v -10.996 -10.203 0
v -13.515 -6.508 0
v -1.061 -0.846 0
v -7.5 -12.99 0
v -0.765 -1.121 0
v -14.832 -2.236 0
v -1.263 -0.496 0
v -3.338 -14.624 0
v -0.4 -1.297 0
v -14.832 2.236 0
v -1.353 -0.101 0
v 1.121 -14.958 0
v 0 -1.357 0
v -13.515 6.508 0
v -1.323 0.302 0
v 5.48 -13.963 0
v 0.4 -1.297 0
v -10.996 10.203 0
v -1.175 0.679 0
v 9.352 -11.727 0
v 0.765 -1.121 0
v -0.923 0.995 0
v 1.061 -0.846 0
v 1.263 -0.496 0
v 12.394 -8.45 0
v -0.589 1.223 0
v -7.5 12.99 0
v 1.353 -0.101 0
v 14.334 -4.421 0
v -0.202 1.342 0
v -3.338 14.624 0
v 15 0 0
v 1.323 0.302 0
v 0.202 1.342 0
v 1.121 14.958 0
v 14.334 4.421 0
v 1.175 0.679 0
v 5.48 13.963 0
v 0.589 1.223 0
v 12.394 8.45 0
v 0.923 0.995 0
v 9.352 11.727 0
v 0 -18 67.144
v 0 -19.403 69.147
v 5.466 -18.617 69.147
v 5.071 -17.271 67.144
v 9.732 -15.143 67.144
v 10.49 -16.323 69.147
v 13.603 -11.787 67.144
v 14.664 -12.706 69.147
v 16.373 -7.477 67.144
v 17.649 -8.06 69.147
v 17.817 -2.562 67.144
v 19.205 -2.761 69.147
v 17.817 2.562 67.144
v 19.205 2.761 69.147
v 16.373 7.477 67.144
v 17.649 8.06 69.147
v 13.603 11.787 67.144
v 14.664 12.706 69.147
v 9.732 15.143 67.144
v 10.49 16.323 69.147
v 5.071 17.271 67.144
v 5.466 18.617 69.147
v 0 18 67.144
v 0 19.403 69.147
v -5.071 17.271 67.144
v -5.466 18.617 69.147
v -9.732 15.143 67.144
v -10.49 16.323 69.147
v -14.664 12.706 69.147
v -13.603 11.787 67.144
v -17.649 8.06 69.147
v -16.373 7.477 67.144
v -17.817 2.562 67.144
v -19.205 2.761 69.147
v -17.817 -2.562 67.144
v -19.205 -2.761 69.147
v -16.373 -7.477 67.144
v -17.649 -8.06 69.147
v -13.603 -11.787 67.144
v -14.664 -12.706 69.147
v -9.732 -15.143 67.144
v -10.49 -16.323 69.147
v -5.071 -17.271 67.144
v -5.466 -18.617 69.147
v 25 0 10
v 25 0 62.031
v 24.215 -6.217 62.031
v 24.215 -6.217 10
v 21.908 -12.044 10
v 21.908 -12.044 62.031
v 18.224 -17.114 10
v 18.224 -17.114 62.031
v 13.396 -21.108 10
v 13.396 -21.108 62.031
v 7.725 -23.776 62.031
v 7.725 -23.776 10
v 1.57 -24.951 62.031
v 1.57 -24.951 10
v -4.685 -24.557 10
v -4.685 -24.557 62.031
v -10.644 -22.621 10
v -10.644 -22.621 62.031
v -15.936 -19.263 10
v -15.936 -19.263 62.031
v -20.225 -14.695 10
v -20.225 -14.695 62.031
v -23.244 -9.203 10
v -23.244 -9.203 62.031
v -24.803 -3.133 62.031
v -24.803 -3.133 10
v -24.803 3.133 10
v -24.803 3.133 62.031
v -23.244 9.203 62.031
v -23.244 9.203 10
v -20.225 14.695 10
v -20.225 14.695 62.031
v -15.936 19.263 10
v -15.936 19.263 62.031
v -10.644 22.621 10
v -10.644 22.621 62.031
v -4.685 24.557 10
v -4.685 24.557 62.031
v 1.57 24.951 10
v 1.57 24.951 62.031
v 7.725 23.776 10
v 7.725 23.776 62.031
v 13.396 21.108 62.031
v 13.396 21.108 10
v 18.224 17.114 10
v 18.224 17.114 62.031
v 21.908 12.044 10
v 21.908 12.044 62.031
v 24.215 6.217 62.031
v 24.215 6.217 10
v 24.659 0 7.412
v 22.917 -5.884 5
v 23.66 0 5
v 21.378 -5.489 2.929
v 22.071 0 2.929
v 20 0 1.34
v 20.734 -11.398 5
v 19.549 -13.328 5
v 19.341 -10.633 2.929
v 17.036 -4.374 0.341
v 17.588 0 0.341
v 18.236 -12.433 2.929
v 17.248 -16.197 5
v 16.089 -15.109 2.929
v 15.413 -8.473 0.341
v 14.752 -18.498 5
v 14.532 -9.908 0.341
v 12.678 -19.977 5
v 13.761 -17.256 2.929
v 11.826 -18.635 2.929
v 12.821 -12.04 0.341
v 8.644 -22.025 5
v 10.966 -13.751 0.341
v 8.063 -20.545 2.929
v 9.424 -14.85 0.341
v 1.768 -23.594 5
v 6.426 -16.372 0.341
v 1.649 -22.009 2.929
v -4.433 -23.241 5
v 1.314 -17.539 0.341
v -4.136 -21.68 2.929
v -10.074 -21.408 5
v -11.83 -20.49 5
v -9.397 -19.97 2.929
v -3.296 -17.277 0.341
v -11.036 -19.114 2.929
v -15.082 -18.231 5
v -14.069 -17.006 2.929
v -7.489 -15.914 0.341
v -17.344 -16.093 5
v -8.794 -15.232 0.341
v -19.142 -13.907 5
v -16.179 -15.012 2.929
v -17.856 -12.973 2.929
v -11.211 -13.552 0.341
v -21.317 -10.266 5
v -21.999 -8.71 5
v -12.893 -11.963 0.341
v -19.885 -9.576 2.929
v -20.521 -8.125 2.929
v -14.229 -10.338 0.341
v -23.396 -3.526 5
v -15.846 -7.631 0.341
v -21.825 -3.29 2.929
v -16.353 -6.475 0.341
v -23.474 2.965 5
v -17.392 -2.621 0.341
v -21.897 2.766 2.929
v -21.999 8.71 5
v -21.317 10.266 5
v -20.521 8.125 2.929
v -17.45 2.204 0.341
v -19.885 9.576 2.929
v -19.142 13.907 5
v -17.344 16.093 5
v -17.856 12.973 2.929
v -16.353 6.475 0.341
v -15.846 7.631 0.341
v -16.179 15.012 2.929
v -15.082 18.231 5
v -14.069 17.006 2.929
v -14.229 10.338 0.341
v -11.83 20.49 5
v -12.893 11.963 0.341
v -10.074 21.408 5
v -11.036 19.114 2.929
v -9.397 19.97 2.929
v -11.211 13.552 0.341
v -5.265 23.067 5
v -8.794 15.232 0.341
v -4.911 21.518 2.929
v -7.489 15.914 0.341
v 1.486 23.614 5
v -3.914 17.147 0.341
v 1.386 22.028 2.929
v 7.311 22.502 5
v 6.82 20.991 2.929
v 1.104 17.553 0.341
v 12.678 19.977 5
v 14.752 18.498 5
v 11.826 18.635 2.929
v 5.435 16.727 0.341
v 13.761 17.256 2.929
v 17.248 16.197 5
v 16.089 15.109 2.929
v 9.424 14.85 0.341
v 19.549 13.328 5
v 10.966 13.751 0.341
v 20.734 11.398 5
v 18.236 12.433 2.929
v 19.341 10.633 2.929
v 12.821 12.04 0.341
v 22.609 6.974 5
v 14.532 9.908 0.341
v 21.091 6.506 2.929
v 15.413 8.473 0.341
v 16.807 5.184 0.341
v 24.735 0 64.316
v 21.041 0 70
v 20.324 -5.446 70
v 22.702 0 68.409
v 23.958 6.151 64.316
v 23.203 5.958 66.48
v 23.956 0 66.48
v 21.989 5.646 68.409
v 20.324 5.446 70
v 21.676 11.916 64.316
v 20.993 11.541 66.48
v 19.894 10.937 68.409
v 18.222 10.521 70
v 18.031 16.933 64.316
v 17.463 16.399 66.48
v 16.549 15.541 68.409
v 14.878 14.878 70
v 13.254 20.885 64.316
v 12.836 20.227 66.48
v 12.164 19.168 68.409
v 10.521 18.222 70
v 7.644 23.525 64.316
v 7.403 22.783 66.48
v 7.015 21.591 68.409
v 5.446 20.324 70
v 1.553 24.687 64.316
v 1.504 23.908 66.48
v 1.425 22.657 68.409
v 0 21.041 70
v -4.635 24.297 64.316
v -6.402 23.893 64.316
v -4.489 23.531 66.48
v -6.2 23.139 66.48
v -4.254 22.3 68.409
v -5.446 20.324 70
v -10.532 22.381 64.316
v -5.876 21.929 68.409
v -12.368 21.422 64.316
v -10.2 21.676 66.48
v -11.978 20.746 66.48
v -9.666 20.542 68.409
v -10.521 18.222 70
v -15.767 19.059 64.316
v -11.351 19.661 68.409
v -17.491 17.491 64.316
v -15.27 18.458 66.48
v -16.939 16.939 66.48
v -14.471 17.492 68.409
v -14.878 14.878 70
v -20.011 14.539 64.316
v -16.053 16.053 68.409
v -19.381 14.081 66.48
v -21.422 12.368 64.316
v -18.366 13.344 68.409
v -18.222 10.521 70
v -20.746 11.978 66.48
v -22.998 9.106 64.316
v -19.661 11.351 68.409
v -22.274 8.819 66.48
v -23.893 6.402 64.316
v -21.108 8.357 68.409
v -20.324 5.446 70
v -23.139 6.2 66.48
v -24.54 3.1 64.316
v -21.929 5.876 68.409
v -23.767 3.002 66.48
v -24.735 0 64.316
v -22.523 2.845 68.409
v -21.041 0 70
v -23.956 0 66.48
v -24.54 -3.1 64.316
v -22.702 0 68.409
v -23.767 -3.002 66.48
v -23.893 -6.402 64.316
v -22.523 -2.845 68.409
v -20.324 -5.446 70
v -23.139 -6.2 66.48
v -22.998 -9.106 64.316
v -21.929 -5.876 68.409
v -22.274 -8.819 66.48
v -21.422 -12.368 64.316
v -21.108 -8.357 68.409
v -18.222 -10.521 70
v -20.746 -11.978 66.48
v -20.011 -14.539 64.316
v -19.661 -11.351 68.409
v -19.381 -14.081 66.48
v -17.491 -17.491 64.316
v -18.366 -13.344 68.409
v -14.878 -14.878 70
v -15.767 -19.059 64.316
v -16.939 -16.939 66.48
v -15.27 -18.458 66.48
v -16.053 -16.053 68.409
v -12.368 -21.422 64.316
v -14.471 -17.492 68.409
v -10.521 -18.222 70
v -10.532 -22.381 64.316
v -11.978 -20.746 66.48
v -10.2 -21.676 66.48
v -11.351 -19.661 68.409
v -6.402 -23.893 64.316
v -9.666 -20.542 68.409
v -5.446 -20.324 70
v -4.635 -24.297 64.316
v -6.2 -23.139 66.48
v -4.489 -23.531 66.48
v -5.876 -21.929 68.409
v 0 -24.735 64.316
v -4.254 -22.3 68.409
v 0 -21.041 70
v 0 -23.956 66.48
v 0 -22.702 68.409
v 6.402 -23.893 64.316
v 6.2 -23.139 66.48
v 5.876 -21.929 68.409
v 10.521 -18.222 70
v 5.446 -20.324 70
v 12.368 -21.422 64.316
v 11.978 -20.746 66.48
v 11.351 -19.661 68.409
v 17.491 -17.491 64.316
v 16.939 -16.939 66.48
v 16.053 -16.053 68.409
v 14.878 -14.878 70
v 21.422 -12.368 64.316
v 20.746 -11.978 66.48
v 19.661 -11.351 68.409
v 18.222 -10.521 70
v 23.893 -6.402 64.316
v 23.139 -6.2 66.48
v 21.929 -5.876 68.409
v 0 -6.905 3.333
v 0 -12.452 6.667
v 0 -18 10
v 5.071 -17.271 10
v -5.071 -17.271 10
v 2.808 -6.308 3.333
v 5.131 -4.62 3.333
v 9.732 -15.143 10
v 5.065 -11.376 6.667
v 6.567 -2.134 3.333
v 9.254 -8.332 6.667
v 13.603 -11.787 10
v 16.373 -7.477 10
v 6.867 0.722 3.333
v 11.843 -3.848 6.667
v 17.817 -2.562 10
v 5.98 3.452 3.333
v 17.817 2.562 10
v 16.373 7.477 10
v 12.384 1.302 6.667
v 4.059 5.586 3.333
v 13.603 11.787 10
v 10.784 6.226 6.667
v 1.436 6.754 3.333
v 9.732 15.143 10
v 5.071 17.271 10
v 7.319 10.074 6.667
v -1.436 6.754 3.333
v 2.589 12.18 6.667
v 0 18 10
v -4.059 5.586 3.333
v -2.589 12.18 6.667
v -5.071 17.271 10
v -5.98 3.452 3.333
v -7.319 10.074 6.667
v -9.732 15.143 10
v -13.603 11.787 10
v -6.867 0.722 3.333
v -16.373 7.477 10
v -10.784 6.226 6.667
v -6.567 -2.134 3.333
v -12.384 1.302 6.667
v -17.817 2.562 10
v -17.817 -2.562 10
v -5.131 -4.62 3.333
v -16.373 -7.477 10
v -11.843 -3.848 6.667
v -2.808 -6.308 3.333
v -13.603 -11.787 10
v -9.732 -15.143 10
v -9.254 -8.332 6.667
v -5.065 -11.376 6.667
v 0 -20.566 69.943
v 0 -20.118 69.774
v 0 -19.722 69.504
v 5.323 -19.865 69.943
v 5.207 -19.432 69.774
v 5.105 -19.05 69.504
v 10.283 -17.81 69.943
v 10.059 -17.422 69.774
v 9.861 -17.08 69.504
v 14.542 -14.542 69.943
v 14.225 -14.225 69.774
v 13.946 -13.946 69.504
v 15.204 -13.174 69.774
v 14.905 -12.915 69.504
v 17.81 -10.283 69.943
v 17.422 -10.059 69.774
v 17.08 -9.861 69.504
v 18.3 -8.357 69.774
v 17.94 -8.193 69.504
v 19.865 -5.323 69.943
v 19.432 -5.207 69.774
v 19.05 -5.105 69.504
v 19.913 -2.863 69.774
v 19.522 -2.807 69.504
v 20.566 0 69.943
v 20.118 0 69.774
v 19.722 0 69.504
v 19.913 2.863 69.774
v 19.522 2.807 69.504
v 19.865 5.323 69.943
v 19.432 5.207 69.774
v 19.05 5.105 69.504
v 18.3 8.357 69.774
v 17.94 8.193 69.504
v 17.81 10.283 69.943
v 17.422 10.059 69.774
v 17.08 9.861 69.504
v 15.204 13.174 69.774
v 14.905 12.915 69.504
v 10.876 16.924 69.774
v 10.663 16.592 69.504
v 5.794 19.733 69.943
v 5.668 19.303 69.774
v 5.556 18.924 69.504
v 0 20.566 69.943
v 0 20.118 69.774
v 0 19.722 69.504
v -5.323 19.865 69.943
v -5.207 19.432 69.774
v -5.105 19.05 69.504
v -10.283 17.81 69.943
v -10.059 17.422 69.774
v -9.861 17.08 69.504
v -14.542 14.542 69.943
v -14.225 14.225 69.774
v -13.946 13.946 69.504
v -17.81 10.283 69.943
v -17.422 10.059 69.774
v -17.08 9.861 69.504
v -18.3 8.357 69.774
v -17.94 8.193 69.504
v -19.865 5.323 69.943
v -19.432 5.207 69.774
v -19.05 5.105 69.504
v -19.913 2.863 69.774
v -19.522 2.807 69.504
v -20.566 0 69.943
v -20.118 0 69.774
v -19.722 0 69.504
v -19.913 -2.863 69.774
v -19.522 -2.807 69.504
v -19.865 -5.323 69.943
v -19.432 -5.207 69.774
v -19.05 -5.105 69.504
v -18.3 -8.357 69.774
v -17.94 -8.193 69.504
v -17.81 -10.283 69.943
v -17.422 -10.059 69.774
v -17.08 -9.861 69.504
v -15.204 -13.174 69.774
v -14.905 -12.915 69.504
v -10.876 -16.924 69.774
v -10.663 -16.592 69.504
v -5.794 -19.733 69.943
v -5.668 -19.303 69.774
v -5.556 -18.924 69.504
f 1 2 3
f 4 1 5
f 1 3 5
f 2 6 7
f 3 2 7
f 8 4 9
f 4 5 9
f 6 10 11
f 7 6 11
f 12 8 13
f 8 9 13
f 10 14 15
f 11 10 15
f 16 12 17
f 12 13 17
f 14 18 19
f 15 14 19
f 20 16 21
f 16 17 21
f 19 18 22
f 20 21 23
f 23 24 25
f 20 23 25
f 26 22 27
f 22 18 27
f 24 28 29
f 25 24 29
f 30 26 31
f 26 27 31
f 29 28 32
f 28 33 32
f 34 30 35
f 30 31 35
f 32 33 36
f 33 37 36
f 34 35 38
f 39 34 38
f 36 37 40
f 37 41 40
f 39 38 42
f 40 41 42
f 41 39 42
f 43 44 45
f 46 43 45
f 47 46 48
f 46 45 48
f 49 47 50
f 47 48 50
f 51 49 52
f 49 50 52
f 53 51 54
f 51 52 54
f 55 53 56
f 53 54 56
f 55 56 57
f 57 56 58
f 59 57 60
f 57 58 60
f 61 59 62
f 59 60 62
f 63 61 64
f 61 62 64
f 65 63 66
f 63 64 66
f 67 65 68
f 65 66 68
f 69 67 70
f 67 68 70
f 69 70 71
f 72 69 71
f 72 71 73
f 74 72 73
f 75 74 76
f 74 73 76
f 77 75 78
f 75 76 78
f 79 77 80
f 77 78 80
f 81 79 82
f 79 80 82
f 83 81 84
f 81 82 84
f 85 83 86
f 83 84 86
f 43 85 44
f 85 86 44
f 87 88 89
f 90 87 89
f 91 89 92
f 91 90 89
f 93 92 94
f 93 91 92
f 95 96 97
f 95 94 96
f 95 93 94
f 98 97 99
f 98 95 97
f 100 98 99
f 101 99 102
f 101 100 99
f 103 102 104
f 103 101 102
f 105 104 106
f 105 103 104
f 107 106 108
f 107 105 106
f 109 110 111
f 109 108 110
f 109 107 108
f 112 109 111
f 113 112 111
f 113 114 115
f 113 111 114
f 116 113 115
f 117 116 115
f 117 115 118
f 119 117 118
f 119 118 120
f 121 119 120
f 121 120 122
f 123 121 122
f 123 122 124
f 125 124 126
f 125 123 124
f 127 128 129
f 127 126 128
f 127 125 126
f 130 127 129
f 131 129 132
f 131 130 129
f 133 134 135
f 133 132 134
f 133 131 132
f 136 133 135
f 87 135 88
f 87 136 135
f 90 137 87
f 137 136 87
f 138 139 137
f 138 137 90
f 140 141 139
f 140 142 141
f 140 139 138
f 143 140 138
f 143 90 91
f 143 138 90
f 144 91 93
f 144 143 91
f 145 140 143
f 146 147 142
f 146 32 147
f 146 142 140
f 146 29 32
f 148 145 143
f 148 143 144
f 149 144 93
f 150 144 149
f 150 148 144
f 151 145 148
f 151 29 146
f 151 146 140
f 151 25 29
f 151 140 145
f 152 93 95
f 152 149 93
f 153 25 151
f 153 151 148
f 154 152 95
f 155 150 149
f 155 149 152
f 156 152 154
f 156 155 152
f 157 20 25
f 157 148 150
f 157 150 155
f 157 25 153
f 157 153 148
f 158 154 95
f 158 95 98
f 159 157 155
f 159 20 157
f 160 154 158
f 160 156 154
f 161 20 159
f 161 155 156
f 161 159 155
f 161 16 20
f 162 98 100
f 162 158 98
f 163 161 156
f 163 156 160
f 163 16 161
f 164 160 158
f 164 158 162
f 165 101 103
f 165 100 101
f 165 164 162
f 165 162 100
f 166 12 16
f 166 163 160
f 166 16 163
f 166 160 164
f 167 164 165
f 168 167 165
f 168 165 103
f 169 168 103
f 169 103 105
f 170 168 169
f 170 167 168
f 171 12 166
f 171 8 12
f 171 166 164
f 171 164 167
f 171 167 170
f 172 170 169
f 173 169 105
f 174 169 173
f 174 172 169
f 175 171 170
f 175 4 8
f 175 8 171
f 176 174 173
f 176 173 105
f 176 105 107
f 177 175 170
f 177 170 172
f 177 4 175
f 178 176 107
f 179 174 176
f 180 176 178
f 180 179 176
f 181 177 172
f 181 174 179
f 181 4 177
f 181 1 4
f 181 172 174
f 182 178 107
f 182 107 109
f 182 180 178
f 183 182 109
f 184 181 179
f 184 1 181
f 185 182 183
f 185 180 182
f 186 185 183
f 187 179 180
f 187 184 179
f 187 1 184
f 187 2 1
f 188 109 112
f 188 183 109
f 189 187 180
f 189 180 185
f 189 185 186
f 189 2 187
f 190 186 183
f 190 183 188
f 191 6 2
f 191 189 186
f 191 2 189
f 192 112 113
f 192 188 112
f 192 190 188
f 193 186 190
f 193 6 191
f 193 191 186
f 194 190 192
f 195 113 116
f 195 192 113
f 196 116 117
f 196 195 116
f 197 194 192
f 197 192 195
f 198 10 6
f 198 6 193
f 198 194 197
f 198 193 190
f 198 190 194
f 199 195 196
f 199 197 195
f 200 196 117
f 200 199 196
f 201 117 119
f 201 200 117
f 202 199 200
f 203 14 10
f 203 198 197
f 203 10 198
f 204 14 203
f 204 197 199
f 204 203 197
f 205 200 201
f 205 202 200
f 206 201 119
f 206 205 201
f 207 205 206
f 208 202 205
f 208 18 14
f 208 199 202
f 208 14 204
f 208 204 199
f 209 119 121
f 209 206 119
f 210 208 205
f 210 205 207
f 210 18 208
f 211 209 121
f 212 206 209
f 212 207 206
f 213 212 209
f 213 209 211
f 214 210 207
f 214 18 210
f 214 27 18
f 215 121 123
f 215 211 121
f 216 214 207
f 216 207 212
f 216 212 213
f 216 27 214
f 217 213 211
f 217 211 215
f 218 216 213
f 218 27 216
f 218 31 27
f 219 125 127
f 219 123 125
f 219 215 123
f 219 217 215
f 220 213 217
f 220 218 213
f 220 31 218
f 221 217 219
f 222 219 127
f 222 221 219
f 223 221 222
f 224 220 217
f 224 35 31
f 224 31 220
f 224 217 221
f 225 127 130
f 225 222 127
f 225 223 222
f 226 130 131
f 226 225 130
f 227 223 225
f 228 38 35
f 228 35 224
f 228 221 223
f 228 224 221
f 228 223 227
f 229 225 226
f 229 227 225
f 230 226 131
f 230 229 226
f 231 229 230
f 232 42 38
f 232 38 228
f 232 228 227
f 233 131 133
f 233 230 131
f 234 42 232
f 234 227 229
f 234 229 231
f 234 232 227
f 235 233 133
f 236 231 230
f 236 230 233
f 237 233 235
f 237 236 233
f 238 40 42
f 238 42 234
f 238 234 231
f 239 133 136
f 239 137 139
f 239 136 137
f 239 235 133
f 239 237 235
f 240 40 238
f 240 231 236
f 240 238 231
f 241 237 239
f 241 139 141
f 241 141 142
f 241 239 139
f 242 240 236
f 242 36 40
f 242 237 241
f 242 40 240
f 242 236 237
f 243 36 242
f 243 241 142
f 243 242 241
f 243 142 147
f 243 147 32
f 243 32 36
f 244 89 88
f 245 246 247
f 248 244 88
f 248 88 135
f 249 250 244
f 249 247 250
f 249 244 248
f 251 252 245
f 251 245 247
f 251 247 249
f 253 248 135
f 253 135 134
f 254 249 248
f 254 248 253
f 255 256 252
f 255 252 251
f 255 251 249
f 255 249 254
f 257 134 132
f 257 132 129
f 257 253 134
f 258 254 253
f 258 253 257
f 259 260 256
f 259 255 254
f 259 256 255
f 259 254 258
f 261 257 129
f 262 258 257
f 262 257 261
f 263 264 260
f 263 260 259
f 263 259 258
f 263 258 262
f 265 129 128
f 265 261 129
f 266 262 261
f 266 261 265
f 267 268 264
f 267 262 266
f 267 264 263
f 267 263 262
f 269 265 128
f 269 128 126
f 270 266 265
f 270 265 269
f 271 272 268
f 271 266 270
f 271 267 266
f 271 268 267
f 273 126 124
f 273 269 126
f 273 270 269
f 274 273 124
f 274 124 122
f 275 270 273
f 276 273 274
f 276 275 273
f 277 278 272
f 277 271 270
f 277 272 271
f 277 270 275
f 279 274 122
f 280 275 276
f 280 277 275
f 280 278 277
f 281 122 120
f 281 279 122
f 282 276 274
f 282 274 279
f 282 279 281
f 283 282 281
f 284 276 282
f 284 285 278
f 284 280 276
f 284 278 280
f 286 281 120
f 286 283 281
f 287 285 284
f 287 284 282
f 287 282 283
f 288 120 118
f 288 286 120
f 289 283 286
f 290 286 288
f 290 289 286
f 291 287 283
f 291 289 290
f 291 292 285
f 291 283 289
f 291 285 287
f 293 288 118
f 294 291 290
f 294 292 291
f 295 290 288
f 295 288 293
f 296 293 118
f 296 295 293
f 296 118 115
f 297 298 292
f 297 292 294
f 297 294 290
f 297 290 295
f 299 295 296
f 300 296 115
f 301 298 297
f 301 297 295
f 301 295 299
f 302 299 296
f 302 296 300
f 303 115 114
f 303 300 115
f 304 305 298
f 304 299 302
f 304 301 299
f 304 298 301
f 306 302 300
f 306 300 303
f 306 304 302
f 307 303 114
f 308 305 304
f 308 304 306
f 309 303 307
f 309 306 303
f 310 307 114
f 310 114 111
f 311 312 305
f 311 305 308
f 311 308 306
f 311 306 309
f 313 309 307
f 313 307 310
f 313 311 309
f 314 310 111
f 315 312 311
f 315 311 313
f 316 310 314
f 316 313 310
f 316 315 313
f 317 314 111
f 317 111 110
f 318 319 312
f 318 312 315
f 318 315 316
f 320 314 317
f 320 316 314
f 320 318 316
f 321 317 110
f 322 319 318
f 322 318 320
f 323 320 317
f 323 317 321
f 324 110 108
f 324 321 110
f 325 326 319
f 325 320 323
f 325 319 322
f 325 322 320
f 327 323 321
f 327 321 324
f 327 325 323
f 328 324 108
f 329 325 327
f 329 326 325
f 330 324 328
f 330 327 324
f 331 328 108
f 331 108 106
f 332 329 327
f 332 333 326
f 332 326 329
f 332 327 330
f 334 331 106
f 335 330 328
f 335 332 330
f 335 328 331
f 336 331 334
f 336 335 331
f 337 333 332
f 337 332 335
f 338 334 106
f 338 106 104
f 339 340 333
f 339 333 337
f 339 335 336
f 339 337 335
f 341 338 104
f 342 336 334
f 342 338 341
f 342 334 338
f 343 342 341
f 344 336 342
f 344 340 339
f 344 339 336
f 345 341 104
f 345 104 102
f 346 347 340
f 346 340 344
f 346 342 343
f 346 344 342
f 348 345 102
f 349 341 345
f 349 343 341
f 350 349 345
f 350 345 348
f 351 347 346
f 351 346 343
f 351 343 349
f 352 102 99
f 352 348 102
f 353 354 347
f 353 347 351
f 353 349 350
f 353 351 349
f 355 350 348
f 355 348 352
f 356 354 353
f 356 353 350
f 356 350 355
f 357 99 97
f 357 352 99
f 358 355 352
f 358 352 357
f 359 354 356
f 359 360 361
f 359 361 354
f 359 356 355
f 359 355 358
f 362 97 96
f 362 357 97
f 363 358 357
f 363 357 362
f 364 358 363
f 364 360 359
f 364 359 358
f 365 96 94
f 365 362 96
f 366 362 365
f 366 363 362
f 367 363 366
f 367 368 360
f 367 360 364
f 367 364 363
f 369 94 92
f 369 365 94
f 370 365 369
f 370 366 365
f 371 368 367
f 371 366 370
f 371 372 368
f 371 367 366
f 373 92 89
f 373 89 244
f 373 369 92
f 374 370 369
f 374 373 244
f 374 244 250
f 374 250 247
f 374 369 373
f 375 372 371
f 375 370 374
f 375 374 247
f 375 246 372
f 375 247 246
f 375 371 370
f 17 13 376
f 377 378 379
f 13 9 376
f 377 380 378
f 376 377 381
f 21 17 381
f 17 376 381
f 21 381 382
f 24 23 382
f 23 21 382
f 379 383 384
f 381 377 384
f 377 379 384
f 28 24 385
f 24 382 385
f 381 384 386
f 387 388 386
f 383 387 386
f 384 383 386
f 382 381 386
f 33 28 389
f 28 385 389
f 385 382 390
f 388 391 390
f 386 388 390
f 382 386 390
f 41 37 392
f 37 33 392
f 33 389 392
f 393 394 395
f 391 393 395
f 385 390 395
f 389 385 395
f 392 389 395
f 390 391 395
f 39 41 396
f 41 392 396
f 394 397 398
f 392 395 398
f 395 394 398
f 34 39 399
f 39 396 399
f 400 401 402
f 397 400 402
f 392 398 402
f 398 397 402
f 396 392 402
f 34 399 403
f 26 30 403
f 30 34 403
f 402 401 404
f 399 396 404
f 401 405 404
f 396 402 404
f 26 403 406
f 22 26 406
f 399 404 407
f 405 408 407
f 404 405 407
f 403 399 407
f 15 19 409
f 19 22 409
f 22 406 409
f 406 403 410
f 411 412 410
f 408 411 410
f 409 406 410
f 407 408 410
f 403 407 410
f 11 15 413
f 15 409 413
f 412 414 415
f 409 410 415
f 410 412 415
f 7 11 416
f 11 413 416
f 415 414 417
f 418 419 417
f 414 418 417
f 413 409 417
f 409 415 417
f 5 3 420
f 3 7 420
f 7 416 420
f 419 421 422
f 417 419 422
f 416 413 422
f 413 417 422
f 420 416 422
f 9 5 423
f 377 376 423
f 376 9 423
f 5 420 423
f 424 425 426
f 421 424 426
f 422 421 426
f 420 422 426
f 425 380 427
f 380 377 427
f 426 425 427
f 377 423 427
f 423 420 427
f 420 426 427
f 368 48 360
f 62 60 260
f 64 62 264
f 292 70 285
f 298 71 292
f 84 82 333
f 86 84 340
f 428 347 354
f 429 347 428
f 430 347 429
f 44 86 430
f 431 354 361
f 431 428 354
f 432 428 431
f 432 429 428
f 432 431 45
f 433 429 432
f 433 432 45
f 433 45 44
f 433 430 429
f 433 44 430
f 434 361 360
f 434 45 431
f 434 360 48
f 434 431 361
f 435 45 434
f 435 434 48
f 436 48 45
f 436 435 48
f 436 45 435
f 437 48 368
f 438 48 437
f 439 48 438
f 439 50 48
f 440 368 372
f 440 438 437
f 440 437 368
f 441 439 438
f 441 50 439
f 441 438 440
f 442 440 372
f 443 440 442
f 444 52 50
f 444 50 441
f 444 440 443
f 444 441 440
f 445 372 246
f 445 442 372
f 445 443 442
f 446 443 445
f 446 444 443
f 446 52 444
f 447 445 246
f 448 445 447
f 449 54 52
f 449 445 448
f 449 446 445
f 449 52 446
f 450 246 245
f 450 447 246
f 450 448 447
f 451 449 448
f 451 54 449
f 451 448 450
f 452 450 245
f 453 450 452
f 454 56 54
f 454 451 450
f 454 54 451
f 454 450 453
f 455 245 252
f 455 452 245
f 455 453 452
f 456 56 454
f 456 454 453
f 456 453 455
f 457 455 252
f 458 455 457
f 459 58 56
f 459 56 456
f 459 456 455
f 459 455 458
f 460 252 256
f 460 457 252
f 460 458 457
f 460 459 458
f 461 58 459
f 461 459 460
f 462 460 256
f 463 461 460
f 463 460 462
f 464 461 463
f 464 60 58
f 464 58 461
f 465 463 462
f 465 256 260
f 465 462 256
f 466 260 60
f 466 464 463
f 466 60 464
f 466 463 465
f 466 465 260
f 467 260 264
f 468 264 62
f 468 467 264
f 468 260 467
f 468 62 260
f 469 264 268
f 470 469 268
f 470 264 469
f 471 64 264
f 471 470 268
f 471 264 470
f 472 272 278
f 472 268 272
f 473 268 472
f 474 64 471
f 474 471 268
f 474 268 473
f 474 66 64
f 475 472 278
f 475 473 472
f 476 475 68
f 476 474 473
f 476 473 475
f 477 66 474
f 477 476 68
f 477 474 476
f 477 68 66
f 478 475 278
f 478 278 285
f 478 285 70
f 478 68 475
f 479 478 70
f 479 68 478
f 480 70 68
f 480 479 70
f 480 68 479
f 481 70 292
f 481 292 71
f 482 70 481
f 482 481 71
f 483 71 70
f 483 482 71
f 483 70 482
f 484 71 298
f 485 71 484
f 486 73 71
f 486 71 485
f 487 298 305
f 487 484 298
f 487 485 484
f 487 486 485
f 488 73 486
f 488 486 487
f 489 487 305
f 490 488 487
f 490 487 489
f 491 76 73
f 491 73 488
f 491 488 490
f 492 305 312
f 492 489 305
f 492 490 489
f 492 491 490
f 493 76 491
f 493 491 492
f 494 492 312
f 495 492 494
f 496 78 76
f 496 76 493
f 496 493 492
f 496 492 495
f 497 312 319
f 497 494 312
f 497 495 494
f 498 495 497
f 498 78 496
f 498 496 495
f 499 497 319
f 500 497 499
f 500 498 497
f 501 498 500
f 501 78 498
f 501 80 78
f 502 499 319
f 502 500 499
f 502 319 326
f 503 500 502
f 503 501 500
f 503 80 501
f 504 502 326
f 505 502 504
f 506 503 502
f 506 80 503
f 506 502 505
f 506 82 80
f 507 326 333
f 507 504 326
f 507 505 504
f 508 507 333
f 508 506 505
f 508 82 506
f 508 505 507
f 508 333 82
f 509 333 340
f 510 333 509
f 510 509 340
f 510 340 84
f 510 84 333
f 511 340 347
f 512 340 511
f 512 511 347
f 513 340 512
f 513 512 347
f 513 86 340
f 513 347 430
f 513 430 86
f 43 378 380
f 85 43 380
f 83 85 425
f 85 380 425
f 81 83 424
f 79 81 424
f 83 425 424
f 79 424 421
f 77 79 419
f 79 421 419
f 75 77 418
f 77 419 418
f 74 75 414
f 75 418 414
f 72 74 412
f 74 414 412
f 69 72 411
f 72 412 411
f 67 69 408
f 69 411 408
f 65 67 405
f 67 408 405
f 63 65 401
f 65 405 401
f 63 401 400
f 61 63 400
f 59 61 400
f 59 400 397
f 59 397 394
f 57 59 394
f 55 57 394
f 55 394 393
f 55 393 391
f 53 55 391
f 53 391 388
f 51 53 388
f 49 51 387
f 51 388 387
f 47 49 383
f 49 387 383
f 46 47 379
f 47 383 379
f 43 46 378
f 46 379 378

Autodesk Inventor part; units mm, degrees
ref_plane "YZ Plane" through (0, 0, 0) normal (1, 0, 0) x (0, 1, 0)
ref_plane "XZ Plane" through (0, 0, 0) normal (0, 1, 0) x (-1, 0, 0)
ref_plane "XY Plane" through (0, 0, 0) normal (0, 0, 1) x (1, 0, 0)
sketch "Sketch1" plane through (0, 0, 0) normal (0, 0, 1) x (1, 0, 0)
  circle A0 centre (0, 0) radius 25
  dimension "d0" = 50
extrude "Extrusion1" add sketch "Sketch1" along normal blind 70
hole "Hole1" at (0, 0, 70) direction (0, 0, -1) diameter 36 depth 60 tip angle 118 countersink diameter 40 countersink angle 70
fillet "Fillet1" radius 2 1 edges at (0, 20, 70)
sketch "Sketch2" plane through (0, 0, 70) normal (0, 0, 1) x (1, 0, 0)
  point P0 (0, 0)
fillet "Fillet2" radius 10 1 edges at (-25, 0, 0)
fillet "Fillet3" radius 10 1 edges at (-25, 0, 70)
sketch3d "3D Sketch2"
properties part number "solenoid_looking_pot"
